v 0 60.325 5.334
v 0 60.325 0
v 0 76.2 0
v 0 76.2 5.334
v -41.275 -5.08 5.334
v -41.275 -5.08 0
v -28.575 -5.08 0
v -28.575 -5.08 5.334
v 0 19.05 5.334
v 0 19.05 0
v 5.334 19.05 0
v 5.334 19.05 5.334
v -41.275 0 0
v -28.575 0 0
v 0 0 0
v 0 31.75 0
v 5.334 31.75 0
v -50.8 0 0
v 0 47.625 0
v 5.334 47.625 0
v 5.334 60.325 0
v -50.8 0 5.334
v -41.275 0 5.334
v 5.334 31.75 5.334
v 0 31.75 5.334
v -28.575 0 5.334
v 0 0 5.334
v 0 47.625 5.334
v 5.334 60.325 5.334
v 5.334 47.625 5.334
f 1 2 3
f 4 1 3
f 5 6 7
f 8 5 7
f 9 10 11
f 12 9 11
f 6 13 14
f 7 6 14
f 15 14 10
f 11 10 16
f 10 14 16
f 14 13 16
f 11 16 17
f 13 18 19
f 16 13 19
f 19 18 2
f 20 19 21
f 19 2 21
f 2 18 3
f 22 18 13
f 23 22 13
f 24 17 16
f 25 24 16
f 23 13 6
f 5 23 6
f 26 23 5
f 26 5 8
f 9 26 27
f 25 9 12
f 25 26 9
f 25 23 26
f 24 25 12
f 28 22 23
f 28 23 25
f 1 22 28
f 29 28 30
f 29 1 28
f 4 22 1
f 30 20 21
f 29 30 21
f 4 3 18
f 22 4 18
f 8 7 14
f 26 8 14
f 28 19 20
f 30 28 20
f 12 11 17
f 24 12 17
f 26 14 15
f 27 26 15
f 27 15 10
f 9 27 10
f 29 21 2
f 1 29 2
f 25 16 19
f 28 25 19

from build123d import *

# Parameters (mm, degrees)
BOSS_EXTRUDE1_DEPTH = 5.334


with BuildPart() as part:
    # Sketch1 → Boss-Extrude1 (new body)
    with BuildSketch(Plane.XY):
        Polygon((0, 0), (0, 19.05), (5.334, 19.05), (5.334, 31.75), (0, 31.75), (0, 47.625), (5.334, 47.625), (5.334, 60.325), (0, 60.325), (0, 76.2), (-50.8, 0), (-41.275, 0), (-41.275, -5.08), (-28.575, -5.08), (-28.575, 0), align=None)
    extrude(amount=BOSS_EXTRUDE1_DEPTH)


solid = part.part
